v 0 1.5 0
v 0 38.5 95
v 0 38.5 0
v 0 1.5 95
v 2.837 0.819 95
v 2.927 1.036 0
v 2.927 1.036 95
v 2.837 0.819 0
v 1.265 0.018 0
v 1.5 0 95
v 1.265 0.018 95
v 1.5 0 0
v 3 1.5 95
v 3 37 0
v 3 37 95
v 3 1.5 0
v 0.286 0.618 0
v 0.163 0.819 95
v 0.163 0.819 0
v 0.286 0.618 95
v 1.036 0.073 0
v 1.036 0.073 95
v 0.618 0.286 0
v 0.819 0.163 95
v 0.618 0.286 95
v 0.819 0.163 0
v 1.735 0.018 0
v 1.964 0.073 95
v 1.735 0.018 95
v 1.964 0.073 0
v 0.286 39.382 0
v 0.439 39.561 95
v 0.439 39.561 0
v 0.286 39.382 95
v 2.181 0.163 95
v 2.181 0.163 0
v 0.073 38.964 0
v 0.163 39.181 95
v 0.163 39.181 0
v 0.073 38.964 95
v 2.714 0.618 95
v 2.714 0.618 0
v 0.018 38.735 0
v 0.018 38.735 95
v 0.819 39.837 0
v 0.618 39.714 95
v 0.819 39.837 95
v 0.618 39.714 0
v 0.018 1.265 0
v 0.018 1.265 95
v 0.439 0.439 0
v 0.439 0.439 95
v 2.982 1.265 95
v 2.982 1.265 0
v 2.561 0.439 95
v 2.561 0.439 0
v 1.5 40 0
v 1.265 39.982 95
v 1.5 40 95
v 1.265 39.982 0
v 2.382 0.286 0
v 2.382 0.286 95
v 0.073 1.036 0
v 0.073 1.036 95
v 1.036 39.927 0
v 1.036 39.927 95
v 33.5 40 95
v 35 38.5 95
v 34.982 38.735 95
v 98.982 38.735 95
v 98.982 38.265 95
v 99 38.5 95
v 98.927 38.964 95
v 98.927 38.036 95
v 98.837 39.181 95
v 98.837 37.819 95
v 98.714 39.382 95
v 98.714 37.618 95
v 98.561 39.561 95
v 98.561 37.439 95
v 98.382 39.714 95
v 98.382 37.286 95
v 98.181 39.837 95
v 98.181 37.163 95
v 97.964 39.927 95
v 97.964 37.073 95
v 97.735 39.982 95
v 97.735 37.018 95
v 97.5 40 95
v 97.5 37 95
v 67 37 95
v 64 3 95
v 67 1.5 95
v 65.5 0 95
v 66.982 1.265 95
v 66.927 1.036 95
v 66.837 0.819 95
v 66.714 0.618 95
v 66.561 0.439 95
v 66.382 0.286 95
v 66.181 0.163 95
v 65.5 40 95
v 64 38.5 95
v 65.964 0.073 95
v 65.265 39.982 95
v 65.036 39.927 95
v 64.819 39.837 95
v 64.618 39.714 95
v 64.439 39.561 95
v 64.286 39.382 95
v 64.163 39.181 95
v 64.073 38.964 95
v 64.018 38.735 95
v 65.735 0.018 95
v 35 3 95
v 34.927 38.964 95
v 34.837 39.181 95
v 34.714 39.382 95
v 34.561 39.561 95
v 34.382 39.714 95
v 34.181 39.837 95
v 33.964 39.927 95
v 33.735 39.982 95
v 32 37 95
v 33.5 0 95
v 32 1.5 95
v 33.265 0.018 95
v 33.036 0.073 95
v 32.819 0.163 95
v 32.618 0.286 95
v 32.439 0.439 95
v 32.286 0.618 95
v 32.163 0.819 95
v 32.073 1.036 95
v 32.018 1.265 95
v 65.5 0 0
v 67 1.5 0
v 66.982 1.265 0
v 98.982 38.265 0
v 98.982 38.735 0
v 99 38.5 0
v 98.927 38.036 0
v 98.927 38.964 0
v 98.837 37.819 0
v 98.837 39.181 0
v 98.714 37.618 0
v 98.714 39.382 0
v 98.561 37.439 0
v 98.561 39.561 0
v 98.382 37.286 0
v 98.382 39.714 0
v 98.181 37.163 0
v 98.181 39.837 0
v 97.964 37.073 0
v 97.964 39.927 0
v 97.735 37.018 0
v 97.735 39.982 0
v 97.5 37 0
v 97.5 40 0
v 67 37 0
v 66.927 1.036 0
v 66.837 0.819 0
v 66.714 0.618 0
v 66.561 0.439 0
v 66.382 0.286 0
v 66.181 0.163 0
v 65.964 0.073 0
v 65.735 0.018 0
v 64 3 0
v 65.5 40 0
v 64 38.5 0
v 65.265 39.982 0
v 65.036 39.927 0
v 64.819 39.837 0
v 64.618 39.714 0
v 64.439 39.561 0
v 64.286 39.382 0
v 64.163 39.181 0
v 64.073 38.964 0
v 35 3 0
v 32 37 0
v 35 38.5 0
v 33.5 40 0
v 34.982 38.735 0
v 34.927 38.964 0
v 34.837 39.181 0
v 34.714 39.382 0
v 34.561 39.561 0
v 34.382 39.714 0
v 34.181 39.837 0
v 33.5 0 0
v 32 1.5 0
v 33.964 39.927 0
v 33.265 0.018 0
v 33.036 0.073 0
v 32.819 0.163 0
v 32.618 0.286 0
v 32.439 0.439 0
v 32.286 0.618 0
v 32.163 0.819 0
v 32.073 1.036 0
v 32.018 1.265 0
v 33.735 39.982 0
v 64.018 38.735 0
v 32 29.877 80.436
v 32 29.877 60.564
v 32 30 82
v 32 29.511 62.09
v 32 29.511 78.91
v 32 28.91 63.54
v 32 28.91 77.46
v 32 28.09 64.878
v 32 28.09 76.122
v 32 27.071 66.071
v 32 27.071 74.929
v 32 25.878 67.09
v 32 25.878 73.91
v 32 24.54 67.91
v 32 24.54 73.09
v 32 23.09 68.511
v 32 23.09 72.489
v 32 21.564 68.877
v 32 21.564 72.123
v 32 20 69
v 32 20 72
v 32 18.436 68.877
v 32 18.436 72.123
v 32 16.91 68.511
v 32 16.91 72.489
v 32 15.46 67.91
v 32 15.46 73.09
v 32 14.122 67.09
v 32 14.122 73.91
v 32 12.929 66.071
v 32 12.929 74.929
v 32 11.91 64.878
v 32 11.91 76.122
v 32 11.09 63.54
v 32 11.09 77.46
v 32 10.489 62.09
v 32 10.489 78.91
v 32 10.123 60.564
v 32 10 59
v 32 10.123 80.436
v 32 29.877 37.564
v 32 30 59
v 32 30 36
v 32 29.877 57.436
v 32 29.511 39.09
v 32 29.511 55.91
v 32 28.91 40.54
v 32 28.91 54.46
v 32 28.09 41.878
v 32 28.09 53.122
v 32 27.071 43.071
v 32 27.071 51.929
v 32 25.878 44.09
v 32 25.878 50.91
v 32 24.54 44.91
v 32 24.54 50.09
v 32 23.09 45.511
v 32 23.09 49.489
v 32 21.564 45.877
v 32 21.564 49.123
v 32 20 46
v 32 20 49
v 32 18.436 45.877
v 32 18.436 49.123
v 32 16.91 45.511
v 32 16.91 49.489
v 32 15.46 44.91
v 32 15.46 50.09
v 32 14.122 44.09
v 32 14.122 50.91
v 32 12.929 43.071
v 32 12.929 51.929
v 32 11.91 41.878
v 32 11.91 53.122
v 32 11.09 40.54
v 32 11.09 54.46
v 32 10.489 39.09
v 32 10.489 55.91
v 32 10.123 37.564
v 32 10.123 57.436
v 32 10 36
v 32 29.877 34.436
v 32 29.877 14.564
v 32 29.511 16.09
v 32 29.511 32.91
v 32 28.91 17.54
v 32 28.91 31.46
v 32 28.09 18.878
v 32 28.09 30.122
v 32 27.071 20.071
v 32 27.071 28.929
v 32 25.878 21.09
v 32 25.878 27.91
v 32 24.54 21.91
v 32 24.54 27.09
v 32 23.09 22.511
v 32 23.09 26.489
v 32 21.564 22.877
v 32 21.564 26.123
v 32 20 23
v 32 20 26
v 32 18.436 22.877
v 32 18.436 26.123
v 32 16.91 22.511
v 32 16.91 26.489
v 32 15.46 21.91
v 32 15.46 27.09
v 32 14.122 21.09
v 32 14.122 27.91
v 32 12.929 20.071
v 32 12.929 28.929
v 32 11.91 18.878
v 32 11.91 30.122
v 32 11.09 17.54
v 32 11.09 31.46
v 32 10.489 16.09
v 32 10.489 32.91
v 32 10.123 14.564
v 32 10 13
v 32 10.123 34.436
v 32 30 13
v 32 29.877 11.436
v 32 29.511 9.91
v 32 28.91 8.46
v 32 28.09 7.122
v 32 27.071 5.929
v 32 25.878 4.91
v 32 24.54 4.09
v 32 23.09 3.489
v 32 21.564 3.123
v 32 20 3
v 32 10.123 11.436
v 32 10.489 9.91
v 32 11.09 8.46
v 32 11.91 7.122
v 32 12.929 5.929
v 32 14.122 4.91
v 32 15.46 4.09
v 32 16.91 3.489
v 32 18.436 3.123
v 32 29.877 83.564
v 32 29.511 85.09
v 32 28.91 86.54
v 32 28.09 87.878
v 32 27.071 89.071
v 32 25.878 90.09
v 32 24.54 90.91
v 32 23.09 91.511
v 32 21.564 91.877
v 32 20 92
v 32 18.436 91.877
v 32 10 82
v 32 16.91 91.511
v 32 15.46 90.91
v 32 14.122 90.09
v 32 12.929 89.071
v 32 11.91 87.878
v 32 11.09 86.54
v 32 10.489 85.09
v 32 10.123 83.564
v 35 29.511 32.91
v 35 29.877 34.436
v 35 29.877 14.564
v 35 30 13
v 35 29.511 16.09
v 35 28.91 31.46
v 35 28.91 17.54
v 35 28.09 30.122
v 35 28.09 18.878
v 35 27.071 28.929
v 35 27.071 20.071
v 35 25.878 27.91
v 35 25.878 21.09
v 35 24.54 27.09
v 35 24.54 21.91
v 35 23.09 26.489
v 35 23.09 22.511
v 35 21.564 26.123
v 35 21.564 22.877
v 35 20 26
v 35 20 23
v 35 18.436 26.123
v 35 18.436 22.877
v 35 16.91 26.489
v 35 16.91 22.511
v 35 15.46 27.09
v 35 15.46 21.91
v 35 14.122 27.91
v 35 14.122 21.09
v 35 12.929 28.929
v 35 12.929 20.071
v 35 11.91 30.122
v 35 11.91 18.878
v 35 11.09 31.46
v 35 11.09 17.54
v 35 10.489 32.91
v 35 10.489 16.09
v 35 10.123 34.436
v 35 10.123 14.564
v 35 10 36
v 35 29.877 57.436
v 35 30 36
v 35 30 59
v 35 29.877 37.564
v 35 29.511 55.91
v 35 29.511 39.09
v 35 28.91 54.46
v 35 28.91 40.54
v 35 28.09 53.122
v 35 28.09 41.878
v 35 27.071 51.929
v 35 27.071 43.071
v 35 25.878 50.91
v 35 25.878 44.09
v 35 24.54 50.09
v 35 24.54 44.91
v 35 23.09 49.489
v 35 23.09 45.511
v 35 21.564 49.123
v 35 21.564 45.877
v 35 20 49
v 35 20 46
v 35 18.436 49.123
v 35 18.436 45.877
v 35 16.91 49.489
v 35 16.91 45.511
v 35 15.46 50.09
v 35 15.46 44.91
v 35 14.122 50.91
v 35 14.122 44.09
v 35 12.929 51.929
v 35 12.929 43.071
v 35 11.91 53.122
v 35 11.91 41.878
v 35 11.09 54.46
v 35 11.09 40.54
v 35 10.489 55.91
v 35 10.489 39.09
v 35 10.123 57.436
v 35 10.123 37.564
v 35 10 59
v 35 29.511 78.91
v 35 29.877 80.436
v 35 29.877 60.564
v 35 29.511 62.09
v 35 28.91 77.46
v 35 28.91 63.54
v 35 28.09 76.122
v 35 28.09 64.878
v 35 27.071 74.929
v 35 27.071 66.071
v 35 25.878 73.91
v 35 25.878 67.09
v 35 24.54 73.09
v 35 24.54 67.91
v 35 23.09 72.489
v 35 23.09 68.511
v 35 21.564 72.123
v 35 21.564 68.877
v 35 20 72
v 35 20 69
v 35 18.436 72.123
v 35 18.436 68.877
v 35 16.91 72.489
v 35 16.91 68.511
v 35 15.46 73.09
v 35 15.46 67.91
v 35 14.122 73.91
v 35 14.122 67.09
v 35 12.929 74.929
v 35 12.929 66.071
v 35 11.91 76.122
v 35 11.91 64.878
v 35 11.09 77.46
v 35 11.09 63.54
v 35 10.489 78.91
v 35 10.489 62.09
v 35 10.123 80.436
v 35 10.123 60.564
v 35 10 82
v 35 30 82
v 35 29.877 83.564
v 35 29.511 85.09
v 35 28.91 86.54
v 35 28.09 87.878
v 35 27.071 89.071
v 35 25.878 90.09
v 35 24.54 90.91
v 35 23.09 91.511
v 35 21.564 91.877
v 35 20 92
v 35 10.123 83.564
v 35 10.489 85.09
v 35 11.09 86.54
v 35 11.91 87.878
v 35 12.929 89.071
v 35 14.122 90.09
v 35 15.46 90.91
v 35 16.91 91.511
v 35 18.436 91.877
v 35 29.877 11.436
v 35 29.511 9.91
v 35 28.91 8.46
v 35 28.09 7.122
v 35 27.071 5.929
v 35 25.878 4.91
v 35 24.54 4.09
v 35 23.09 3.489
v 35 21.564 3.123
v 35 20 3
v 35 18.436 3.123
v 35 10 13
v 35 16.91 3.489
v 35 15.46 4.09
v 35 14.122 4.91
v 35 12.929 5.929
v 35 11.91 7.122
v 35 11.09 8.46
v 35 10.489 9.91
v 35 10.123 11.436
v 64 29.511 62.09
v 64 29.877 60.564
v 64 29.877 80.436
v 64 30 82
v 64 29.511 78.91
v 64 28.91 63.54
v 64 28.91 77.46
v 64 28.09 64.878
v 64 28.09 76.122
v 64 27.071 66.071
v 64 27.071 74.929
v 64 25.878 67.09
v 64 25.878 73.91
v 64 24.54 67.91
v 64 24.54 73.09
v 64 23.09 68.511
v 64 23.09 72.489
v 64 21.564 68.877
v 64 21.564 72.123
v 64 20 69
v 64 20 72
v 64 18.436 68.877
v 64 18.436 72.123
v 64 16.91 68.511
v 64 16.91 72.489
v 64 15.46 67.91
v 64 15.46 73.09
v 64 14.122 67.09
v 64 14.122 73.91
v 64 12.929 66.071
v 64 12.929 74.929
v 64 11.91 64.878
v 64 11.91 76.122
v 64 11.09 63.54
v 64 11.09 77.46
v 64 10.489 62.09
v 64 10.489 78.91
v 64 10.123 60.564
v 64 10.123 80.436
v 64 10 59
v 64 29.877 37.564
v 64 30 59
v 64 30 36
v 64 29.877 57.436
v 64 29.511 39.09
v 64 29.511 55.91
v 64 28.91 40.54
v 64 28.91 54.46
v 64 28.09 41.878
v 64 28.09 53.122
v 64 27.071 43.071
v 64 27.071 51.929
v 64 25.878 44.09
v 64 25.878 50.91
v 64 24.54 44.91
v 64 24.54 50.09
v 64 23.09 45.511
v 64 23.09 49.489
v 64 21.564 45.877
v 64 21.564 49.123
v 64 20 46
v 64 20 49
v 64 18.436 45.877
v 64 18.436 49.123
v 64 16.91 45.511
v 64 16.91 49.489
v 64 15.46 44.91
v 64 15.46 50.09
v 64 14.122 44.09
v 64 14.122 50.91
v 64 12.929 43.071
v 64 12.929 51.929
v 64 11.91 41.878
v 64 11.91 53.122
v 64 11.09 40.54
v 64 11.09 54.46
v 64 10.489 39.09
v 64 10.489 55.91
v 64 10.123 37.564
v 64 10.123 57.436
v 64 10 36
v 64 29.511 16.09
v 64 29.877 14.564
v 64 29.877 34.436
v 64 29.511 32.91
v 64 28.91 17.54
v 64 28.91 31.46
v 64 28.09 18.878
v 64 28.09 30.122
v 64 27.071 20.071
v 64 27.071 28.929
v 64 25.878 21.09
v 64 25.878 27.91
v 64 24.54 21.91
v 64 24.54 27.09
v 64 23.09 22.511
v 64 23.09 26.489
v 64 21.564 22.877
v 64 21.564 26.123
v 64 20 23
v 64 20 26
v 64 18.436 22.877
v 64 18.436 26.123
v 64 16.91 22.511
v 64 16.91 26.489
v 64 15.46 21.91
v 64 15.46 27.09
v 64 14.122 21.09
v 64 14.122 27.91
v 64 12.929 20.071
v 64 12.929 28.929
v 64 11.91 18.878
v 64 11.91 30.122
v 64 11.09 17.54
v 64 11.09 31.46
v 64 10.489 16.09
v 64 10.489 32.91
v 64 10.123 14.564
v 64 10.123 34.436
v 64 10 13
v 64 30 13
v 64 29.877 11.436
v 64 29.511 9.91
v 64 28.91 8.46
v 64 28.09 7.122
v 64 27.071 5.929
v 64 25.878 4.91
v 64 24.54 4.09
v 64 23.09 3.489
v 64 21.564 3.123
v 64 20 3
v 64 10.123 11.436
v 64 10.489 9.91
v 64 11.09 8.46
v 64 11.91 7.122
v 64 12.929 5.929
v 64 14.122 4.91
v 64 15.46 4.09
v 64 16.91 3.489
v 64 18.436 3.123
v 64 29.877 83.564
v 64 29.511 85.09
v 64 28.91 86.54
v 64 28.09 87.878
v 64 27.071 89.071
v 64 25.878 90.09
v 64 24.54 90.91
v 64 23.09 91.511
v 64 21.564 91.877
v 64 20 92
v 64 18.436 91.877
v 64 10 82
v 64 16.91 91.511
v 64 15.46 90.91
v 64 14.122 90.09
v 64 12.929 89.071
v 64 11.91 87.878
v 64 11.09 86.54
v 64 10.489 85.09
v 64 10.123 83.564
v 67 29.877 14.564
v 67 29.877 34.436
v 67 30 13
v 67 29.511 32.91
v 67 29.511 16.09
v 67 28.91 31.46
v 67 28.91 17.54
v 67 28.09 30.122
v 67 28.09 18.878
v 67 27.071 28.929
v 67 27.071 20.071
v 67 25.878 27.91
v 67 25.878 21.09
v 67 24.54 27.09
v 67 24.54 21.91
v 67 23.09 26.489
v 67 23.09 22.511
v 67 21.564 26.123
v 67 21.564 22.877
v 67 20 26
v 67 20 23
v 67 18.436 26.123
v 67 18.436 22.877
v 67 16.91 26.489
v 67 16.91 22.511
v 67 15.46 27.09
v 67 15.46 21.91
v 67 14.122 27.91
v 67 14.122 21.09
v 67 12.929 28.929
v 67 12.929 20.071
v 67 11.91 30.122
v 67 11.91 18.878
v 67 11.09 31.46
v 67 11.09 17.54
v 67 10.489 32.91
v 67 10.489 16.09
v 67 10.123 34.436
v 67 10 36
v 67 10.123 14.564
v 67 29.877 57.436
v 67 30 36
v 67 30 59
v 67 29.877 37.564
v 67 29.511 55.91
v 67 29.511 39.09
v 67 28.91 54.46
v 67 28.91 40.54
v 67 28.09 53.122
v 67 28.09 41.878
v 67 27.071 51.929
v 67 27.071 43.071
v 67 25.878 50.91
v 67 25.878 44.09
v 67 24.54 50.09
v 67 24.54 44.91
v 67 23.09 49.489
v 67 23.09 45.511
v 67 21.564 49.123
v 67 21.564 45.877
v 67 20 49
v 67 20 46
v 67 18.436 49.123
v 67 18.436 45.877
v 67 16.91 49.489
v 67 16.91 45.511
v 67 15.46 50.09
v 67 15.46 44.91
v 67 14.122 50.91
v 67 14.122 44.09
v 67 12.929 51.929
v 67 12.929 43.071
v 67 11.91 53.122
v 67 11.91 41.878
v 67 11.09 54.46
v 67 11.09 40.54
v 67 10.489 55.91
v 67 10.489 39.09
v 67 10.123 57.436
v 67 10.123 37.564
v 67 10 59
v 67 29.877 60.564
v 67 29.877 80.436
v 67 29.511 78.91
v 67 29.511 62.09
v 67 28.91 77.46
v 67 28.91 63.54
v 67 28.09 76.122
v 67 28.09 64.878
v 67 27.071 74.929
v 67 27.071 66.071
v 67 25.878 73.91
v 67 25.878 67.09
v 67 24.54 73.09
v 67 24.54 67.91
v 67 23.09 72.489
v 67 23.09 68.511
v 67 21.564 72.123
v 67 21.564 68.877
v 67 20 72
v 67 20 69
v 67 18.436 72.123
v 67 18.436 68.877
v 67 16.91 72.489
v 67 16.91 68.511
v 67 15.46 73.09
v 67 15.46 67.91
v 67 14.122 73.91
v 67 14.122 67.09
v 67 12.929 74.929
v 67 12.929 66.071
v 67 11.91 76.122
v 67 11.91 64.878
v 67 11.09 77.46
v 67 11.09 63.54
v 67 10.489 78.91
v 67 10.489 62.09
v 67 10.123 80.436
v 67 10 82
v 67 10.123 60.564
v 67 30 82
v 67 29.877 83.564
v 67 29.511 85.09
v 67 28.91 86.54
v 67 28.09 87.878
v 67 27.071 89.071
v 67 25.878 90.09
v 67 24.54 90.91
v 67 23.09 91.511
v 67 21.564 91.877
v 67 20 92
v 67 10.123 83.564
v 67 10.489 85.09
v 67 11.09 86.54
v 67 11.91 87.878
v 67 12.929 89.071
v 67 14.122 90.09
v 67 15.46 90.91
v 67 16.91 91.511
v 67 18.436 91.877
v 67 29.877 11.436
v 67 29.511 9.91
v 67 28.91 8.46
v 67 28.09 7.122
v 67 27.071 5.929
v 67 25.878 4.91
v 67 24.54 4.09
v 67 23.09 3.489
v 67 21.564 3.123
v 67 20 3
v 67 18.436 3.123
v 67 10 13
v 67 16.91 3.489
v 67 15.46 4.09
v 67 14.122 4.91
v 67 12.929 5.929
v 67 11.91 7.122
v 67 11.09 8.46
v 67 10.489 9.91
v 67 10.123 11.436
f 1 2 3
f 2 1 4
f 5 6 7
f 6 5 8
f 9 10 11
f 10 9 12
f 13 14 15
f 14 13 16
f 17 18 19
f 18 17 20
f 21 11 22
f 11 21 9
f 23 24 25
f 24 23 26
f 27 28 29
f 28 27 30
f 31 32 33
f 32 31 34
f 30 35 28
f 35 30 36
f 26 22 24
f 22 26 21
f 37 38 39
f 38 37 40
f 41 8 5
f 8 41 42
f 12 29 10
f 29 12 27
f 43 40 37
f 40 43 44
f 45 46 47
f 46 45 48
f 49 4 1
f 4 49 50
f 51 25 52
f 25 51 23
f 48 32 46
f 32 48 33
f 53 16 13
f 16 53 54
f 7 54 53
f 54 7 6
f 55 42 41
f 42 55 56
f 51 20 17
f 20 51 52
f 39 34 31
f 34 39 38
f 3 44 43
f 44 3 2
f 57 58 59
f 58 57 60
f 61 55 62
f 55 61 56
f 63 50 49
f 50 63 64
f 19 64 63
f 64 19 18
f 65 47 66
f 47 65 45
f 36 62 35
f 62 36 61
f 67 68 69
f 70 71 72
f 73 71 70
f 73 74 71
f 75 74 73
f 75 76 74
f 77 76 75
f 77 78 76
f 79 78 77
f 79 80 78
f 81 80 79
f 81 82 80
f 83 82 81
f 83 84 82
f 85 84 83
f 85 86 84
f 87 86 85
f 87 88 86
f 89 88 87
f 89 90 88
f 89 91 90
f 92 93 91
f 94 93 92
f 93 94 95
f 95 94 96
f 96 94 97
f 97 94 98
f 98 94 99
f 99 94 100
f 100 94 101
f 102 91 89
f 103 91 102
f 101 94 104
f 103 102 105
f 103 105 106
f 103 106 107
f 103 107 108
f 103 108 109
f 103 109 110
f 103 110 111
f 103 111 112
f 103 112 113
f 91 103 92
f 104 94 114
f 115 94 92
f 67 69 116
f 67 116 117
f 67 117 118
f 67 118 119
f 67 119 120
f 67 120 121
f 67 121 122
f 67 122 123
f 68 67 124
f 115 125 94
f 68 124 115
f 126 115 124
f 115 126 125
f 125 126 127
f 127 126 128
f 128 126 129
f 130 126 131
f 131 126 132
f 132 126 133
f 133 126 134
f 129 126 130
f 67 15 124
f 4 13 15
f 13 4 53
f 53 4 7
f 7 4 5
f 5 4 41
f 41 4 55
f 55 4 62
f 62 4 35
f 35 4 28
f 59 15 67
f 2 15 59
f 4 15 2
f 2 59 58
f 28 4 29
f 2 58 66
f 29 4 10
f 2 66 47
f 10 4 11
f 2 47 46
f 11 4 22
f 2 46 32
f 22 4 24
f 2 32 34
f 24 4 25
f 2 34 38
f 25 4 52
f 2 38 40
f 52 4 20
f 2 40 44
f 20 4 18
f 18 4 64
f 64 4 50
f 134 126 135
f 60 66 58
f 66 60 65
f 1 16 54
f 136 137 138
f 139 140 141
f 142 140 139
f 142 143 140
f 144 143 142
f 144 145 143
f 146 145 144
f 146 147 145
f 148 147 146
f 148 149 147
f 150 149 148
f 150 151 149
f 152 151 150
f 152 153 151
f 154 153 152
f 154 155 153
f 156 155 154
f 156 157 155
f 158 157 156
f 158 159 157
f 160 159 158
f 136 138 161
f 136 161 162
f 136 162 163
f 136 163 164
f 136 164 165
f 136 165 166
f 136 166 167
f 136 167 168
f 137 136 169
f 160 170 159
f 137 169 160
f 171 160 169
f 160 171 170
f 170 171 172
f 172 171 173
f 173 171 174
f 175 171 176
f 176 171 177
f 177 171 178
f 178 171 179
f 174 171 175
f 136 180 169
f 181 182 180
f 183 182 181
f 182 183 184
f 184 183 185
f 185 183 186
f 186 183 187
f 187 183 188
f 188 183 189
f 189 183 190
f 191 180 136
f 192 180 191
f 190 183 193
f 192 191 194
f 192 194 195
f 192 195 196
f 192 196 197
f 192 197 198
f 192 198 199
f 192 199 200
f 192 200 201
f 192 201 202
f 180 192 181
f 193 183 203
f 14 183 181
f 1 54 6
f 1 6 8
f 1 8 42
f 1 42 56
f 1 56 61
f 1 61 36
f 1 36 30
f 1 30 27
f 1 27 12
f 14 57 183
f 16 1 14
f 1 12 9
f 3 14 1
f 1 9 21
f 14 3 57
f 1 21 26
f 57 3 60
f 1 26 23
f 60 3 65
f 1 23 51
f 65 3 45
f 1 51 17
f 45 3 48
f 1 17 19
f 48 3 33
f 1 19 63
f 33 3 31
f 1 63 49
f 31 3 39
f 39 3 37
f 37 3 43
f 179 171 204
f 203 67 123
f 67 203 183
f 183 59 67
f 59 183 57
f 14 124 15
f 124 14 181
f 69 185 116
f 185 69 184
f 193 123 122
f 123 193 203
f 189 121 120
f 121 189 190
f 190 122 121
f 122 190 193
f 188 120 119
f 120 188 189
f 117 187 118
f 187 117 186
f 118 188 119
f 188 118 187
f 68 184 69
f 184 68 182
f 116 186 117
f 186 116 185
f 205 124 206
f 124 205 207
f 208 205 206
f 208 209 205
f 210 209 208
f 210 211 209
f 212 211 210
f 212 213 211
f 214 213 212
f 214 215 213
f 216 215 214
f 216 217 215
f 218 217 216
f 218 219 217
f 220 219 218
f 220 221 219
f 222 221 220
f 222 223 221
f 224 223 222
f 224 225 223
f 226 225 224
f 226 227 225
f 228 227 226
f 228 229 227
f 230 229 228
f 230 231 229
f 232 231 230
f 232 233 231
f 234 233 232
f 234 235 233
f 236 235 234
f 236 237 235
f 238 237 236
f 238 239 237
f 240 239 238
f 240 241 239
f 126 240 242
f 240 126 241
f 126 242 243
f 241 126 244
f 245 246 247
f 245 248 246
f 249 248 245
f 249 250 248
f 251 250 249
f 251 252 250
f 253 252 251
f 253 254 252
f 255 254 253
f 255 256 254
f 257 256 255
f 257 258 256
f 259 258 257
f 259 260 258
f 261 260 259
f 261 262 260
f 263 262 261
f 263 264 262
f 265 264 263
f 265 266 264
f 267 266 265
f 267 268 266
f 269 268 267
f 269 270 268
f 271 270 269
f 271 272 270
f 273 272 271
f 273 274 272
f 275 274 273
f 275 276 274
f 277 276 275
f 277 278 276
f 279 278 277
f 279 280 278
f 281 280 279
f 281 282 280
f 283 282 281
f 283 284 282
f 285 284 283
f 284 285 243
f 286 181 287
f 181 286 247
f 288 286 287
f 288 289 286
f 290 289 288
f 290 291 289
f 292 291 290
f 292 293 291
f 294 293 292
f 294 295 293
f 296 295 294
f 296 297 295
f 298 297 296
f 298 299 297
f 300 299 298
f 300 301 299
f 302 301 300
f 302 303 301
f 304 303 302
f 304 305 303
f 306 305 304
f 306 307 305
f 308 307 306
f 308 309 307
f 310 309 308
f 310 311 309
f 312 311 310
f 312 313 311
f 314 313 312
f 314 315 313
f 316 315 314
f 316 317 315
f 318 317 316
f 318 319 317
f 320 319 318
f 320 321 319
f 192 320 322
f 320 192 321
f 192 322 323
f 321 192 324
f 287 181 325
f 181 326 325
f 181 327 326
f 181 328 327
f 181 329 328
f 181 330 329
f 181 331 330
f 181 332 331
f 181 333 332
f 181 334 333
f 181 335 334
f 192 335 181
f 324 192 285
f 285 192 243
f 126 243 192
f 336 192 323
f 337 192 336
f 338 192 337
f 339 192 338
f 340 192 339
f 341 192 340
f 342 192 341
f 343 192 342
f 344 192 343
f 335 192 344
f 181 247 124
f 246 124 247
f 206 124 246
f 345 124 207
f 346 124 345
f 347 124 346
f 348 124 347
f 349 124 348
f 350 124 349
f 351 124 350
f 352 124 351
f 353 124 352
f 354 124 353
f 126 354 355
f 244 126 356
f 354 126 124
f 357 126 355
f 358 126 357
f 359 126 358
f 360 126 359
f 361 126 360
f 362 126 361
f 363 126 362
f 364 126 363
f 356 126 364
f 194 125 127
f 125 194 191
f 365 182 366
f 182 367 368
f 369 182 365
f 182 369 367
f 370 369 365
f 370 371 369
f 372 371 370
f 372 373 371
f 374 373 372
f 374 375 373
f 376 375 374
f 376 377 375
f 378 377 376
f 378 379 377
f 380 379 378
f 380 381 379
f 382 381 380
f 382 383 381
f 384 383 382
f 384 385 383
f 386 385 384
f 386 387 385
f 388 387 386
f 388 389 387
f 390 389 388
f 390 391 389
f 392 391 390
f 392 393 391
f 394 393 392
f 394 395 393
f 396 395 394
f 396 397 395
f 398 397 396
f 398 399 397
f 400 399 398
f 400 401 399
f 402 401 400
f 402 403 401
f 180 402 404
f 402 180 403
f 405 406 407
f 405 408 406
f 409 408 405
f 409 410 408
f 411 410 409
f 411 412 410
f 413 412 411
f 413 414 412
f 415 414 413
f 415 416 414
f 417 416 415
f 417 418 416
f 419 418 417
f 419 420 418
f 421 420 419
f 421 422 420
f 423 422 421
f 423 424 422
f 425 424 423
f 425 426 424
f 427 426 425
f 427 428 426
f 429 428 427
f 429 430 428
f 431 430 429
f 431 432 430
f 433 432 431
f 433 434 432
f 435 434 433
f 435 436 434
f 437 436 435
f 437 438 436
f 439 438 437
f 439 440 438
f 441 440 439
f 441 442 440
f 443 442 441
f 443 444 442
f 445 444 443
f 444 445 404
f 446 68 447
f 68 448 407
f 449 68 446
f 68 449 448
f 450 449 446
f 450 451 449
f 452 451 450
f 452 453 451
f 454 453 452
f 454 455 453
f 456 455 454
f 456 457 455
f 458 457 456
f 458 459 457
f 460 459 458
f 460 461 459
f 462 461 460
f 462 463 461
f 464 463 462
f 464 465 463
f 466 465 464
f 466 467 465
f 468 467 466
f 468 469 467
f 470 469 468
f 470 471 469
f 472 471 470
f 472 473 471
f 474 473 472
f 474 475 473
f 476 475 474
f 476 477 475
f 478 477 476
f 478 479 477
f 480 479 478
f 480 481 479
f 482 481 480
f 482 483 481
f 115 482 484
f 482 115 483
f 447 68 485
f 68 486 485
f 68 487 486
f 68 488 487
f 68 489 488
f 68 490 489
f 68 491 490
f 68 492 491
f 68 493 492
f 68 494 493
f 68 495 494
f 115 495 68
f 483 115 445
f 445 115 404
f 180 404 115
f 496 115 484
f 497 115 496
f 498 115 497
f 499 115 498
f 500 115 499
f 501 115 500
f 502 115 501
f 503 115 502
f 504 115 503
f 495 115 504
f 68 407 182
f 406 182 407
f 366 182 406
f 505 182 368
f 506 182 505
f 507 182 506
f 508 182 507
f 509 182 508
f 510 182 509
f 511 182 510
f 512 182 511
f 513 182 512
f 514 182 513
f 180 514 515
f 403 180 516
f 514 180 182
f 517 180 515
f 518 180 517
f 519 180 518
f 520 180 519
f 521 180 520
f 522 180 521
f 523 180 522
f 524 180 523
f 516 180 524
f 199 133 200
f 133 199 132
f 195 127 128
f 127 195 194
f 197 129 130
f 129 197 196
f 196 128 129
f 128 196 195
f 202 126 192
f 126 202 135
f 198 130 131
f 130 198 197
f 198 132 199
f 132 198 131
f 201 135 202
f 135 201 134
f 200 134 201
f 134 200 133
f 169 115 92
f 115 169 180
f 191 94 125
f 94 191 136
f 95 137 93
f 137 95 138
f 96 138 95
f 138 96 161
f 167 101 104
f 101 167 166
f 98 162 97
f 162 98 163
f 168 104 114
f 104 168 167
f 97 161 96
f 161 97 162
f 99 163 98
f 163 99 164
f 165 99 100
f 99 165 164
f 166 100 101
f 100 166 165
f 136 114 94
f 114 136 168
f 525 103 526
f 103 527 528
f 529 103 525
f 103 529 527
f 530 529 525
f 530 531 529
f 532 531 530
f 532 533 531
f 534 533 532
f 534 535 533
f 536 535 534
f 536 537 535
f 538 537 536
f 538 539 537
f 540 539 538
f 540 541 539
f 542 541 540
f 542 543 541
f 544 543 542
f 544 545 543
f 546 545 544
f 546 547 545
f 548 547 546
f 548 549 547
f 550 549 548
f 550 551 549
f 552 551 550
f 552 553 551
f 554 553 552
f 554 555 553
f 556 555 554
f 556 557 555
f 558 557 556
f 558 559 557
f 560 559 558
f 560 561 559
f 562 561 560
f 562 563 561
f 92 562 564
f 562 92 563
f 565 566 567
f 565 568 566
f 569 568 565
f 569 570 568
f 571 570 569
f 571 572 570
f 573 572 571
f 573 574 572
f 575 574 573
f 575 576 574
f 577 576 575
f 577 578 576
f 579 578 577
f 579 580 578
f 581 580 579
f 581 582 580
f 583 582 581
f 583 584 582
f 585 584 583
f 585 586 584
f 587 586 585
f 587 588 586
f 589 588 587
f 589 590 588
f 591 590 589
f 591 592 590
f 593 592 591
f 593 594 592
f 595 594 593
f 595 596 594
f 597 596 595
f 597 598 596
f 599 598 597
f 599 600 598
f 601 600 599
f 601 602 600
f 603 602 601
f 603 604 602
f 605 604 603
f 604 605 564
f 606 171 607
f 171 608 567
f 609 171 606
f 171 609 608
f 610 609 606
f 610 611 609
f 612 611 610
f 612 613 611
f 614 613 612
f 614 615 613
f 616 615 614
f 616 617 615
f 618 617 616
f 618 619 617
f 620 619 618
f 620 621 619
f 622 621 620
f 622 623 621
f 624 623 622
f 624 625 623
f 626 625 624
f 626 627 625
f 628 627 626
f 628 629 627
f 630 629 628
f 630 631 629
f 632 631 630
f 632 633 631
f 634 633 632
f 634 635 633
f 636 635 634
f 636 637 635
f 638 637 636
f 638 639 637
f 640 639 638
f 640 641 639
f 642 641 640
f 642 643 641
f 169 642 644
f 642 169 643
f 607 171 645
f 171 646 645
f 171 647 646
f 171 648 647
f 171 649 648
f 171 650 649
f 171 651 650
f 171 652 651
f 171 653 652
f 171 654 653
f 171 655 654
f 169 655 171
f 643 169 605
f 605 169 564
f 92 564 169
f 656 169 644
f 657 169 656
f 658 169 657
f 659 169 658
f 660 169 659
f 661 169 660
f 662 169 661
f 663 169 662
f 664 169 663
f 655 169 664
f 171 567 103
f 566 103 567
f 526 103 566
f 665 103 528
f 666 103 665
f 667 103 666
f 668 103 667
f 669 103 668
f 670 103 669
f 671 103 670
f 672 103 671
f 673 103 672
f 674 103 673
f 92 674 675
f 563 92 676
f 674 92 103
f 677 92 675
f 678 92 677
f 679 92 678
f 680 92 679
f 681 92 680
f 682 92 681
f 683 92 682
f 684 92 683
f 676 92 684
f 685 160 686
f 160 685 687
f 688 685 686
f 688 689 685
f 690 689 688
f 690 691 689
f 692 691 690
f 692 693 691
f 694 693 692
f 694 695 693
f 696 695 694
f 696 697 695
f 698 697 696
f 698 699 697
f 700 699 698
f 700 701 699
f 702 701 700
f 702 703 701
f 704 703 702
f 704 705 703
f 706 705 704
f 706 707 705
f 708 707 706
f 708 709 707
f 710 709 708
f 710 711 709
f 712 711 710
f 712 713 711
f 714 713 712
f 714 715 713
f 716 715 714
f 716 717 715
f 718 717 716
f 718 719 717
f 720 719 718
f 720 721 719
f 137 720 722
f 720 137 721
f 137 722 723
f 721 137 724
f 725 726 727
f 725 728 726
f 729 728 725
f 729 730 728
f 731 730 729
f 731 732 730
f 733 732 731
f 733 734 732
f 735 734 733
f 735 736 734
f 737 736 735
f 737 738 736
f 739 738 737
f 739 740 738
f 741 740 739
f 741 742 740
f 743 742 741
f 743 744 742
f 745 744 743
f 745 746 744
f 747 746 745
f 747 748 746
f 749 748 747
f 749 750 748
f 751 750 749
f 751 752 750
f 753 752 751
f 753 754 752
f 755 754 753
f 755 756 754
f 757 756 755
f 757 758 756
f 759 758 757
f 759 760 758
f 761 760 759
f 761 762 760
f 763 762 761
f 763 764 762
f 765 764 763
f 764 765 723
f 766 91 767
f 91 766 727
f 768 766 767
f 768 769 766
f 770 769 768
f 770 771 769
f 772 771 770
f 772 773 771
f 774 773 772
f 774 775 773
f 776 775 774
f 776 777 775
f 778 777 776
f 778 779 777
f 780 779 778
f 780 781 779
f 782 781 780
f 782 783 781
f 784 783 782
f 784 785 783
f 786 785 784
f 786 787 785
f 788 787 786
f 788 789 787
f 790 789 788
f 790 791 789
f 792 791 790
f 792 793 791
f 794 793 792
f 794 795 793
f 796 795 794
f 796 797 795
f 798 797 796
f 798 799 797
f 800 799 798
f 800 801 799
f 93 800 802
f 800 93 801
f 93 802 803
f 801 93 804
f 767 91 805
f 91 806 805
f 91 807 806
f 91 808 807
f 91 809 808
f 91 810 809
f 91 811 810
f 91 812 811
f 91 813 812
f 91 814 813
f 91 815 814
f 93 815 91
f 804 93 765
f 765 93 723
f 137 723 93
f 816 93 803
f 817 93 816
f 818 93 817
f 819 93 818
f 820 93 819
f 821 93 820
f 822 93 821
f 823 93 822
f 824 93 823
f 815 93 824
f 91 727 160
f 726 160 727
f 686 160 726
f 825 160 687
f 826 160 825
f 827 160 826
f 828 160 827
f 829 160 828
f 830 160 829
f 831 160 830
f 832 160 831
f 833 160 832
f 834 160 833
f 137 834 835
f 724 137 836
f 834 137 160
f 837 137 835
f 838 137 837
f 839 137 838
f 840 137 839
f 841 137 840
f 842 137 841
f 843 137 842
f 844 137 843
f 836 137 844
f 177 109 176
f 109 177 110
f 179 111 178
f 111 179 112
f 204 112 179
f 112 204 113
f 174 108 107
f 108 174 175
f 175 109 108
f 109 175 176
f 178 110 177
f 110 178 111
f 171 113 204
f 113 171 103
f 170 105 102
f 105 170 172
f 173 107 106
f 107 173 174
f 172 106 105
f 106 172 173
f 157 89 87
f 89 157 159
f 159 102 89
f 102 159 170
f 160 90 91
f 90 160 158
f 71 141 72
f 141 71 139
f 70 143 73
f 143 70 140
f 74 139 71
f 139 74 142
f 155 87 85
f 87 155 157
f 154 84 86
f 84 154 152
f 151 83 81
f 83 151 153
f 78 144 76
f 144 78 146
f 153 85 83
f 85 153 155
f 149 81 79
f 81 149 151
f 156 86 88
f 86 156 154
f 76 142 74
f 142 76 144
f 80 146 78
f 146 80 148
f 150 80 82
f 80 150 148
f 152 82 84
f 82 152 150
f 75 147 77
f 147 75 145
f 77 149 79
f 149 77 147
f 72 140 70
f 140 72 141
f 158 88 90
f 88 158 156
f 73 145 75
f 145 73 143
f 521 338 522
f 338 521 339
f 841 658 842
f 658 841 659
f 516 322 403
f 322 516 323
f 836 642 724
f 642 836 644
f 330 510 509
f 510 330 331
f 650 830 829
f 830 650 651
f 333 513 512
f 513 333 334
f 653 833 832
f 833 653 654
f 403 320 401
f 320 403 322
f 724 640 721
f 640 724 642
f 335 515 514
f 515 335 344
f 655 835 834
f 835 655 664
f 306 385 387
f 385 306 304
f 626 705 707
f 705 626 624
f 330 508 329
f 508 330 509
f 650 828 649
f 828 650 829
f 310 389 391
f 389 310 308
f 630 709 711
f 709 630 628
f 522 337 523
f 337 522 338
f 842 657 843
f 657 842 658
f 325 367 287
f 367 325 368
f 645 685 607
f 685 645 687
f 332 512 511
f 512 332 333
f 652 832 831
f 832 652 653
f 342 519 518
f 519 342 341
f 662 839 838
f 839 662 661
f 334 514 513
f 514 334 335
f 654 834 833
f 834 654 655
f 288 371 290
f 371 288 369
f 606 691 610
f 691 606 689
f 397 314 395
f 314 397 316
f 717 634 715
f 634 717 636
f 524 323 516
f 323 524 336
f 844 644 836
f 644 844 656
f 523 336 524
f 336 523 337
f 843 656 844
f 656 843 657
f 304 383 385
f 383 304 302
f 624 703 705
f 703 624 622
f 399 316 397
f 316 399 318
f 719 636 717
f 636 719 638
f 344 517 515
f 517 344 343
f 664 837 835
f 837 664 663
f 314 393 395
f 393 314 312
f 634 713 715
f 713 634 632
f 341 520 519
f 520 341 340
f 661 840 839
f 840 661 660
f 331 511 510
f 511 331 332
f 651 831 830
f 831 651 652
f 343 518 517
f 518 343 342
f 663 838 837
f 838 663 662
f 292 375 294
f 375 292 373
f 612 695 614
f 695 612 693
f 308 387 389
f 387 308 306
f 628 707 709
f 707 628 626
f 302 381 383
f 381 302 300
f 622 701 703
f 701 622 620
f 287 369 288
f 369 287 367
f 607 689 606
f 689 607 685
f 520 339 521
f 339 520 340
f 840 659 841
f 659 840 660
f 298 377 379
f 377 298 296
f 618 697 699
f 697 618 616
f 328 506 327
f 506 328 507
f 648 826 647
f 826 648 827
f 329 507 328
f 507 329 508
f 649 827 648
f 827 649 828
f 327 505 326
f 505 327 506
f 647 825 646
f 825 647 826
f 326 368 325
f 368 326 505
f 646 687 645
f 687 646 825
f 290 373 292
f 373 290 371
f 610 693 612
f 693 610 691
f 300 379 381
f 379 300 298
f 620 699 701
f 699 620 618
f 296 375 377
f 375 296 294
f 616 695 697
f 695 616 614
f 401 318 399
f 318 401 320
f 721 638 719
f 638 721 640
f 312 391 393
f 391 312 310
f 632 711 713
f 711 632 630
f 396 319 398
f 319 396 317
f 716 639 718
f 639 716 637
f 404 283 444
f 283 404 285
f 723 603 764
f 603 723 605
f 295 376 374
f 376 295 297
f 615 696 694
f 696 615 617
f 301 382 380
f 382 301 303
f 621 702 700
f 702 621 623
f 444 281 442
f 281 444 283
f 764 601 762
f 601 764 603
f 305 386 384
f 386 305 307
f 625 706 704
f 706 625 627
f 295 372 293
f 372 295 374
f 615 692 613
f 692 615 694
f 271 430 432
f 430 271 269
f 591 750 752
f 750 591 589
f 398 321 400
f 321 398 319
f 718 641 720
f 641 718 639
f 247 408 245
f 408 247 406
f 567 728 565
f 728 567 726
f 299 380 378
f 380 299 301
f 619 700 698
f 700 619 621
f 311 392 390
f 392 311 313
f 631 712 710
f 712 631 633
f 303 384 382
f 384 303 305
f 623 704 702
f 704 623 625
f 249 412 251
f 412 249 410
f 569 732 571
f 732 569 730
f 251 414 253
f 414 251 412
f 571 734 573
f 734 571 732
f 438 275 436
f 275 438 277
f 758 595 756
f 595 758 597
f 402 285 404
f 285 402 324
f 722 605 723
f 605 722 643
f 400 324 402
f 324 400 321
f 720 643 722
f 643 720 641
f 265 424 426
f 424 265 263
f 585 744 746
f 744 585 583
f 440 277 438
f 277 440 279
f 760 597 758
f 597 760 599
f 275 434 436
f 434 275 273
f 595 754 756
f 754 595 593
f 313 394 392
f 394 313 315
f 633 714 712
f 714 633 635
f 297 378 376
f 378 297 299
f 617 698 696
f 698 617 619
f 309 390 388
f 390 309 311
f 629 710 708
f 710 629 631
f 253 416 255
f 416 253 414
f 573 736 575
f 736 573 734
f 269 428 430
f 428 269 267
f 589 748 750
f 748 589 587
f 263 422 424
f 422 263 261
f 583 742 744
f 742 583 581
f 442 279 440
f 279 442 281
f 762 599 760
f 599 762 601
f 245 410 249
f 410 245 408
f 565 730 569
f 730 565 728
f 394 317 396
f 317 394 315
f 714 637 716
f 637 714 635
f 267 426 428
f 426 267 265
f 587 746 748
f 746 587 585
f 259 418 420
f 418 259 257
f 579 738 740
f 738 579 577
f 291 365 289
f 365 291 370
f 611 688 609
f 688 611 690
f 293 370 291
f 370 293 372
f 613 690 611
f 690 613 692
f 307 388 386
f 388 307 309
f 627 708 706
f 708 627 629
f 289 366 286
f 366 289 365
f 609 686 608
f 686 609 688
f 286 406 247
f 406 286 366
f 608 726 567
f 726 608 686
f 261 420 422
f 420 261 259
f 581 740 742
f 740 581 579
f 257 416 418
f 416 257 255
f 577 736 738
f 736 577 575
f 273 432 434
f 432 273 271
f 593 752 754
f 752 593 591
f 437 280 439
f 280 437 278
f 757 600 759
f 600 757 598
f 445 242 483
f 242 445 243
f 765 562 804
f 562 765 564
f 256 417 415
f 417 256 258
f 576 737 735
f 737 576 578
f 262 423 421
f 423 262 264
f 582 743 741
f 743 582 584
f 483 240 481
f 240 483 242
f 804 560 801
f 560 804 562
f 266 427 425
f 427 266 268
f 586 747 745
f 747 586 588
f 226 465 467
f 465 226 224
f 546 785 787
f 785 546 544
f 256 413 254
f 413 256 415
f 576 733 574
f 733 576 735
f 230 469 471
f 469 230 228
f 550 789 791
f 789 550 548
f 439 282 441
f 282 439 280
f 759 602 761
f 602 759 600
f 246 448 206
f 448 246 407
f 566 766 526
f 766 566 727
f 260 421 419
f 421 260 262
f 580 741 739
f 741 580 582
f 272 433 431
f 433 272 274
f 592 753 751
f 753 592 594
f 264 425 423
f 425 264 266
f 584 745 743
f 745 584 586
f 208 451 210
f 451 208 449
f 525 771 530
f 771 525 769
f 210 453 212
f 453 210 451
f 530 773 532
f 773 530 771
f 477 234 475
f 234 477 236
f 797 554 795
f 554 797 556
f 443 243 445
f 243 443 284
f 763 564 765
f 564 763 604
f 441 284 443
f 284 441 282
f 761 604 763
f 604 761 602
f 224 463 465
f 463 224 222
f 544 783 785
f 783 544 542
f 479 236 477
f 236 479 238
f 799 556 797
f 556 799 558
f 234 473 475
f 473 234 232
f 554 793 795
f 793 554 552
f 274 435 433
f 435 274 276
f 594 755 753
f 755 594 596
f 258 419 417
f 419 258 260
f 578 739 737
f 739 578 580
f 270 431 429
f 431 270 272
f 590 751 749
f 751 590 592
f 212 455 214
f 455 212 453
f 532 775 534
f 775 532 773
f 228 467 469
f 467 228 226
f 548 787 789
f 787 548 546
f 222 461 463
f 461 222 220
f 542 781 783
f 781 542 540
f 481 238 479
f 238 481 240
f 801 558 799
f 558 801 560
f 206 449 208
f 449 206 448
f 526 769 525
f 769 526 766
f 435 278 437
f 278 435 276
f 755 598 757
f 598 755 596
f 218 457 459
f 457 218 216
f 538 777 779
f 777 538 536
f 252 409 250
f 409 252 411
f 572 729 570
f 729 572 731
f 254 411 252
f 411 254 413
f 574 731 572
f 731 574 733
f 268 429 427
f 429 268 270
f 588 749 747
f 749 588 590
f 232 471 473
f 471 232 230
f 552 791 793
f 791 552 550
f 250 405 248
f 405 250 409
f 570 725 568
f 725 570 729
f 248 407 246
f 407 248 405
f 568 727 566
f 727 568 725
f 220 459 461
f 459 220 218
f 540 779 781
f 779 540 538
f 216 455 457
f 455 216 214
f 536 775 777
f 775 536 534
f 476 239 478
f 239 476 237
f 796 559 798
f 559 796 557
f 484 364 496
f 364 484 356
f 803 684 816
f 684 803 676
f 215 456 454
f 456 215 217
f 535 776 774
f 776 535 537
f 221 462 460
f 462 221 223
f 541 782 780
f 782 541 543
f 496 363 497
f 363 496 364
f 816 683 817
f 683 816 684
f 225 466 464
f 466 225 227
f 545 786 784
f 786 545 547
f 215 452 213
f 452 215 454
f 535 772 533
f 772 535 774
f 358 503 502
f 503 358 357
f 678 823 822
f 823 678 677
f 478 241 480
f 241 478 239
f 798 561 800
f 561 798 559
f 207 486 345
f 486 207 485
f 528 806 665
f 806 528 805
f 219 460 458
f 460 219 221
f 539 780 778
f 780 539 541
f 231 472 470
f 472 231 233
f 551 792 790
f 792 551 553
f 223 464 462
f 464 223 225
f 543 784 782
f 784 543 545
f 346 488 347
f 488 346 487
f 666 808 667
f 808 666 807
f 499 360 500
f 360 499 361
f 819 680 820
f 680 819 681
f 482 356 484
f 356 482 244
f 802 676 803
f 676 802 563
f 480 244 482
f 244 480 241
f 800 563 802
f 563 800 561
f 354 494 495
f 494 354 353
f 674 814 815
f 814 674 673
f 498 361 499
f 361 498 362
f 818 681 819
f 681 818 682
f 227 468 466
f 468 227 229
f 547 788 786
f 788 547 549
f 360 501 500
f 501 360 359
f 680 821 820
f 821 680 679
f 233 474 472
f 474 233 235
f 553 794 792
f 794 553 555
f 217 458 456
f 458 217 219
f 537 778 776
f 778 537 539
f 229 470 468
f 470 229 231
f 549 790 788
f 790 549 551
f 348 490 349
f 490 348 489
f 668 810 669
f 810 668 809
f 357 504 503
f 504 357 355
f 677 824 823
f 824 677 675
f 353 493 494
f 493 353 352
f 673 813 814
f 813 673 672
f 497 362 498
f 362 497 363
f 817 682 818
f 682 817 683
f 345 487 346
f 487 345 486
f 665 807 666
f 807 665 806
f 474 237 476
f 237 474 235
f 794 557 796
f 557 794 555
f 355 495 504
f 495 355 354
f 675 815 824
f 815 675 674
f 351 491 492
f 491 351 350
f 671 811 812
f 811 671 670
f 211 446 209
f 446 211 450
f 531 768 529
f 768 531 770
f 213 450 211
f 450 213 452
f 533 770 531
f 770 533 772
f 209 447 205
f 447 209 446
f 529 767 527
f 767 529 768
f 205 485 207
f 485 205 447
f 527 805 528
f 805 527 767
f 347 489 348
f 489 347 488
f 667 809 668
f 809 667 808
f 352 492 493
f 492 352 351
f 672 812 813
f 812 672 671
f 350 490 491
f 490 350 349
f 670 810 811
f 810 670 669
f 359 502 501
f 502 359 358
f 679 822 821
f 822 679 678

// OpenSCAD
//use <..\salvador_richter_primitives.scad>

seg = 35;       // [30:1:50]
depth = 40;     // [30:1:50]
dia_marker = 20;// [10:1:30]
n_marker = 4;   // [1:1:10]
wall = 3;       // [2:0.1:5]

difference()
{
    height = n_marker*dia_marker + (n_marker+1)*wall;
    r_corner = wall/2;
    $fn=40;
    
    // the flat parts, starting at center folding one by one
    union()
    {
        rounded_cube([wall,depth,height], rCorner=r_corner, dimensions=2);
        translate([0,depth-wall,0]) 
            rounded_cube([seg,wall,height], rCorner=r_corner, dimensions=2);
        translate([seg-wall,0,0]) 
            rounded_cube([wall,depth,height], rCorner=r_corner, dimensions=2);
        translate([seg-wall,0,0]) 
            rounded_cube([seg,wall,height], rCorner=r_corner, dimensions=2);
        translate([2*(seg-wall),0,0]) 
            rounded_cube([wall,depth,height], rCorner=r_corner, dimensions=2);
        translate([2*(seg-wall),depth-wall,0]) 
            rounded_cube([seg,wall,height], rCorner=r_corner, dimensions=2);
    }
    // the drills for the marker
    for(z = [dia_marker/2+wall:dia_marker+wall:height-(dia_marker/2+wall)])
        translate([2*wall,depth/2,z]) rotate([0,90,0]) cylinder(d=dia_marker, h=3*seg);
}

/*
 * cube with rounded edges and corners, depends on param dimensions
 * outerCube is [X,Y,Z]
 * rCorner is the radius of the edges rounding
 * dimensions 2:   4 edges rounded
 * dimensions 3: all edges rounded corners as well
 */
module rounded_cube(outerCube, rCorner, dimensions=3)
{
    hull()
    {
        for(xPos = [rCorner,outerCube[0]-rCorner])
        {
            for(yPos = [rCorner,outerCube[1]-rCorner])
            {
                if(dimensions==2)
                {
                    translate([xPos,yPos,0]) cylinder(r=rCorner, h=outerCube[2]);
                }
                if(dimensions==3)
                {
                    for(zPos = [rCorner,outerCube[2]-rCorner])
                    {
                        translate([xPos,yPos,zPos]) sphere(r=rCorner);
                    }
                }
            }
        }
    }
}
